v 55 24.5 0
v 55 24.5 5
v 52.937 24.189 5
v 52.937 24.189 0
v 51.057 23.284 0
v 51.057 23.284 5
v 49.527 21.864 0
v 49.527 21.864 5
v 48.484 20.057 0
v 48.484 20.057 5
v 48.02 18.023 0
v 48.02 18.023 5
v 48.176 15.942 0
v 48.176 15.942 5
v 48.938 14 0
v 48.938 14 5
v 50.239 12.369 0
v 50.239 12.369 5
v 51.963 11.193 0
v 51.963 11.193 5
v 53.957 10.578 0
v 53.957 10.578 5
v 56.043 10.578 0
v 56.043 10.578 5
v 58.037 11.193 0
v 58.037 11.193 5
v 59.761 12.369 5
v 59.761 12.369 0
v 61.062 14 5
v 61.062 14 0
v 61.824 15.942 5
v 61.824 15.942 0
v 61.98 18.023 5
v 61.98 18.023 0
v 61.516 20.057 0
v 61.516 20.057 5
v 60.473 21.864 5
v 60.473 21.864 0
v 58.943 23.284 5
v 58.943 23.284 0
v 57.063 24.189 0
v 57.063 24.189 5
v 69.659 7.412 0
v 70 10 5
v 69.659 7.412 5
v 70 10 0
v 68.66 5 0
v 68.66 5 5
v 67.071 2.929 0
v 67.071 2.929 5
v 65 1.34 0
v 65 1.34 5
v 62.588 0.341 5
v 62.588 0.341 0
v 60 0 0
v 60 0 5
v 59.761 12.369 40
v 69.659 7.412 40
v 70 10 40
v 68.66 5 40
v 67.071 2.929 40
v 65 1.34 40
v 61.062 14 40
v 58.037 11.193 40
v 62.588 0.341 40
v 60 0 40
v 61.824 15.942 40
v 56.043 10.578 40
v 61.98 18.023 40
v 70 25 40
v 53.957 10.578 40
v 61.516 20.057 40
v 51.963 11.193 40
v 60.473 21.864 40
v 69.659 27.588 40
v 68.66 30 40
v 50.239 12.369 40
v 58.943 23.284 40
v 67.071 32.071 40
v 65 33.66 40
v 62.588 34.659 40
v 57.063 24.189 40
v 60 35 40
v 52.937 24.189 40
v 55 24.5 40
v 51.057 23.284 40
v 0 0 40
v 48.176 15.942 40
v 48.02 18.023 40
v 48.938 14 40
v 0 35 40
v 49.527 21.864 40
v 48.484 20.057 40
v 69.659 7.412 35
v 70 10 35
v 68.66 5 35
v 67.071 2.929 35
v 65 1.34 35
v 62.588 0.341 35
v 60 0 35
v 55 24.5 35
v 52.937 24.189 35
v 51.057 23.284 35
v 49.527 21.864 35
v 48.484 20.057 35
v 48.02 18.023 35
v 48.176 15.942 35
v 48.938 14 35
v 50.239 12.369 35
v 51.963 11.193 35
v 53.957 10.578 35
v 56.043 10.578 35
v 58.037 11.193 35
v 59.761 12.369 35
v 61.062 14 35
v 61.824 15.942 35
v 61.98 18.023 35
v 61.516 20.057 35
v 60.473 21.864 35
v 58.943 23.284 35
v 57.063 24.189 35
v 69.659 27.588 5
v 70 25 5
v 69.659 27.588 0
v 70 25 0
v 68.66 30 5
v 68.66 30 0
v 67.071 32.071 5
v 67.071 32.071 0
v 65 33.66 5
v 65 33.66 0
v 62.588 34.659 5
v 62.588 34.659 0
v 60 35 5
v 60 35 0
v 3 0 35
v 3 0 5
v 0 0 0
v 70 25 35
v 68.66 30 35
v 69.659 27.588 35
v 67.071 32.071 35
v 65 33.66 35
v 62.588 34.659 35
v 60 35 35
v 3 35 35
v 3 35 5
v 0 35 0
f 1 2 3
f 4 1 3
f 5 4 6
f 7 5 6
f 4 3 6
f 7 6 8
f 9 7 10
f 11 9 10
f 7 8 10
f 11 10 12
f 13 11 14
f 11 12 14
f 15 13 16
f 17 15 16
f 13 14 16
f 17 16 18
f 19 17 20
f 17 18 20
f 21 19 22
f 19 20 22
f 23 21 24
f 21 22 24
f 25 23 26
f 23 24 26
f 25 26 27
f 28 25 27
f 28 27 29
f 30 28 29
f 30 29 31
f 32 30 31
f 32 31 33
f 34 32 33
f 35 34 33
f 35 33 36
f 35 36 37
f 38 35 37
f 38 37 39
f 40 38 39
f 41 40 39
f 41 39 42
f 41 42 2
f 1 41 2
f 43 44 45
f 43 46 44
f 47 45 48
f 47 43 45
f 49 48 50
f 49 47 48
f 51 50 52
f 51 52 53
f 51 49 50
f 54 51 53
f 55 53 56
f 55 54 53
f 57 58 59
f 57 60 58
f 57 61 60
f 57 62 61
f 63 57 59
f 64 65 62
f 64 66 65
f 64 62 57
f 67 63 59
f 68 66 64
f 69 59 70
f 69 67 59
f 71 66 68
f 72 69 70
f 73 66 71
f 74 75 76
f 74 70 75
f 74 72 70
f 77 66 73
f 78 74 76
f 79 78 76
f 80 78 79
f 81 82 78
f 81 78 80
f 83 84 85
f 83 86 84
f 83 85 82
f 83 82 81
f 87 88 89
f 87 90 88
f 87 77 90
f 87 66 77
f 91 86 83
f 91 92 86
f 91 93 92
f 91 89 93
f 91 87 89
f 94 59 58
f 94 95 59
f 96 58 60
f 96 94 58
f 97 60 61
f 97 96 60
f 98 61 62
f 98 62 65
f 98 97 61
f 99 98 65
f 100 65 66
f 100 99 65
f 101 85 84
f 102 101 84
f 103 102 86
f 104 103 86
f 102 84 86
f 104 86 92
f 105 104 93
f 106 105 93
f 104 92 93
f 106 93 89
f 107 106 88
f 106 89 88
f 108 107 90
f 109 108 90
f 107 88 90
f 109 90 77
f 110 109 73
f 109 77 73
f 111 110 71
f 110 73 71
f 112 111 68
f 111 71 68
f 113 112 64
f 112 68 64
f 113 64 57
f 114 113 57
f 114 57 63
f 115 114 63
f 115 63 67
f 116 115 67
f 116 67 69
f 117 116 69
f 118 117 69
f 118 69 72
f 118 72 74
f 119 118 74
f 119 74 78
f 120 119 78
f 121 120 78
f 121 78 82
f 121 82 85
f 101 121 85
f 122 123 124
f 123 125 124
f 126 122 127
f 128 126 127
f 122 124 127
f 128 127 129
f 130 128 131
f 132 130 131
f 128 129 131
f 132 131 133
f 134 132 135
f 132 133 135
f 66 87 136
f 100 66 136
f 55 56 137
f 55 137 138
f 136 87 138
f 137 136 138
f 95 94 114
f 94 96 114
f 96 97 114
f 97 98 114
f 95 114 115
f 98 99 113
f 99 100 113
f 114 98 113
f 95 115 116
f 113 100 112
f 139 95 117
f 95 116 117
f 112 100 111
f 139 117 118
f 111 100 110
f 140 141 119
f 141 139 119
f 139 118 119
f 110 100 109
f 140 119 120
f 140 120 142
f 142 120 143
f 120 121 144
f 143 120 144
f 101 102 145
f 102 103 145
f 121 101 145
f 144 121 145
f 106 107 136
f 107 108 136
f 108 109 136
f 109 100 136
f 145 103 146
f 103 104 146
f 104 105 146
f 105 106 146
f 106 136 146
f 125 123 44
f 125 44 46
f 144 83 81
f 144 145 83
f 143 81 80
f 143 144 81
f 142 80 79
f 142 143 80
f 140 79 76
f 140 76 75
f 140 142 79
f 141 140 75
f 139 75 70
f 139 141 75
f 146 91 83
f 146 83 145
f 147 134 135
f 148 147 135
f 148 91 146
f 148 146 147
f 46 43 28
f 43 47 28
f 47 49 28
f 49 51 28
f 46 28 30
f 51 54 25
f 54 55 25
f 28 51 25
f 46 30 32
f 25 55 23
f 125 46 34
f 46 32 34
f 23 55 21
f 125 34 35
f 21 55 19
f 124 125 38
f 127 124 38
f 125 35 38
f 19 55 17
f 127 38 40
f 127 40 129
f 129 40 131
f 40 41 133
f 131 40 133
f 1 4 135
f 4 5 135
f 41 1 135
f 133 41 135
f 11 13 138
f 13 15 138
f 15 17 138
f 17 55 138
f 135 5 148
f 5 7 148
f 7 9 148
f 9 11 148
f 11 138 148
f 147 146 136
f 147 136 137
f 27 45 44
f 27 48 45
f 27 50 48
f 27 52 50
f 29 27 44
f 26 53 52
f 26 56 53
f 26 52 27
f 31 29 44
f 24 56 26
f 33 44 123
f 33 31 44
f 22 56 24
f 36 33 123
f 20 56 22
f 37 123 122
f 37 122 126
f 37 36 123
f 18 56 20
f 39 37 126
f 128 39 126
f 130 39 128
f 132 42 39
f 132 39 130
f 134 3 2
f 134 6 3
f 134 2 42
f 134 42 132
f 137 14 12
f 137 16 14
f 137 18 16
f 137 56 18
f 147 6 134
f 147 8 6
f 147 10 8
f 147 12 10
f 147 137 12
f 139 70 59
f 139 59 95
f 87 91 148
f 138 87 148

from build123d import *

# Parameters (mm, degrees)
SKETCH1_W           = 40
SKETCH1_H           = 35
BOSS_EXTRUDE1_DEPTH = 3
SKETCH2_W           = 5
SKETCH2_H           = 35
BOSS_EXTRUDE2_DEPTH = 70
FILLET1_R           = 10
SKETCH3_R           = 7
CUT_EXTRUDE1_DEPTH  = 120


with BuildPart() as part:
    # Sketch1 → Boss-Extrude1 (new body)
    with BuildSketch(Plane(origin=(0, 0, 0), x_dir=(0, 0, -1), z_dir=(1, 0, 0))):
        with Locations((-20, 17.5)):
            Rectangle(SKETCH1_W, SKETCH1_H)
    extrude(amount=BOSS_EXTRUDE1_DEPTH)

    # Sketch2 → Boss-Extrude2 (add)
    with BuildSketch(Plane(origin=(0, 0, 0), x_dir=(0, 0, -1), z_dir=(1, 0, 0))):
        with Locations((-37.5, 17.5)):
            Rectangle(SKETCH2_W, SKETCH2_H)
        with Locations((-2.5, 17.5)):
            Rectangle(SKETCH2_W, SKETCH2_H)
    extrude(amount=BOSS_EXTRUDE2_DEPTH)

    # Fillet1
    fillet1_edges = [part.edges().sort_by_distance(p)[0] for p in [
        (70, 35, 37.5),
        (70, 0, 37.5),
        (70, 0, 2.5),
        (70, 35, 2.5),
    ]]
    fillet(fillet1_edges, radius=FILLET1_R)

    # Sketch3 → Cut-Extrude1 (cut)
    with BuildSketch(Plane.XY.offset(40)):
        with Locations(Location((55, 17.5, 0), (0, 0, 90))):
            Circle(SKETCH3_R)
    extrude(amount=-CUT_EXTRUDE1_DEPTH, mode=Mode.SUBTRACT)


solid = part.part
